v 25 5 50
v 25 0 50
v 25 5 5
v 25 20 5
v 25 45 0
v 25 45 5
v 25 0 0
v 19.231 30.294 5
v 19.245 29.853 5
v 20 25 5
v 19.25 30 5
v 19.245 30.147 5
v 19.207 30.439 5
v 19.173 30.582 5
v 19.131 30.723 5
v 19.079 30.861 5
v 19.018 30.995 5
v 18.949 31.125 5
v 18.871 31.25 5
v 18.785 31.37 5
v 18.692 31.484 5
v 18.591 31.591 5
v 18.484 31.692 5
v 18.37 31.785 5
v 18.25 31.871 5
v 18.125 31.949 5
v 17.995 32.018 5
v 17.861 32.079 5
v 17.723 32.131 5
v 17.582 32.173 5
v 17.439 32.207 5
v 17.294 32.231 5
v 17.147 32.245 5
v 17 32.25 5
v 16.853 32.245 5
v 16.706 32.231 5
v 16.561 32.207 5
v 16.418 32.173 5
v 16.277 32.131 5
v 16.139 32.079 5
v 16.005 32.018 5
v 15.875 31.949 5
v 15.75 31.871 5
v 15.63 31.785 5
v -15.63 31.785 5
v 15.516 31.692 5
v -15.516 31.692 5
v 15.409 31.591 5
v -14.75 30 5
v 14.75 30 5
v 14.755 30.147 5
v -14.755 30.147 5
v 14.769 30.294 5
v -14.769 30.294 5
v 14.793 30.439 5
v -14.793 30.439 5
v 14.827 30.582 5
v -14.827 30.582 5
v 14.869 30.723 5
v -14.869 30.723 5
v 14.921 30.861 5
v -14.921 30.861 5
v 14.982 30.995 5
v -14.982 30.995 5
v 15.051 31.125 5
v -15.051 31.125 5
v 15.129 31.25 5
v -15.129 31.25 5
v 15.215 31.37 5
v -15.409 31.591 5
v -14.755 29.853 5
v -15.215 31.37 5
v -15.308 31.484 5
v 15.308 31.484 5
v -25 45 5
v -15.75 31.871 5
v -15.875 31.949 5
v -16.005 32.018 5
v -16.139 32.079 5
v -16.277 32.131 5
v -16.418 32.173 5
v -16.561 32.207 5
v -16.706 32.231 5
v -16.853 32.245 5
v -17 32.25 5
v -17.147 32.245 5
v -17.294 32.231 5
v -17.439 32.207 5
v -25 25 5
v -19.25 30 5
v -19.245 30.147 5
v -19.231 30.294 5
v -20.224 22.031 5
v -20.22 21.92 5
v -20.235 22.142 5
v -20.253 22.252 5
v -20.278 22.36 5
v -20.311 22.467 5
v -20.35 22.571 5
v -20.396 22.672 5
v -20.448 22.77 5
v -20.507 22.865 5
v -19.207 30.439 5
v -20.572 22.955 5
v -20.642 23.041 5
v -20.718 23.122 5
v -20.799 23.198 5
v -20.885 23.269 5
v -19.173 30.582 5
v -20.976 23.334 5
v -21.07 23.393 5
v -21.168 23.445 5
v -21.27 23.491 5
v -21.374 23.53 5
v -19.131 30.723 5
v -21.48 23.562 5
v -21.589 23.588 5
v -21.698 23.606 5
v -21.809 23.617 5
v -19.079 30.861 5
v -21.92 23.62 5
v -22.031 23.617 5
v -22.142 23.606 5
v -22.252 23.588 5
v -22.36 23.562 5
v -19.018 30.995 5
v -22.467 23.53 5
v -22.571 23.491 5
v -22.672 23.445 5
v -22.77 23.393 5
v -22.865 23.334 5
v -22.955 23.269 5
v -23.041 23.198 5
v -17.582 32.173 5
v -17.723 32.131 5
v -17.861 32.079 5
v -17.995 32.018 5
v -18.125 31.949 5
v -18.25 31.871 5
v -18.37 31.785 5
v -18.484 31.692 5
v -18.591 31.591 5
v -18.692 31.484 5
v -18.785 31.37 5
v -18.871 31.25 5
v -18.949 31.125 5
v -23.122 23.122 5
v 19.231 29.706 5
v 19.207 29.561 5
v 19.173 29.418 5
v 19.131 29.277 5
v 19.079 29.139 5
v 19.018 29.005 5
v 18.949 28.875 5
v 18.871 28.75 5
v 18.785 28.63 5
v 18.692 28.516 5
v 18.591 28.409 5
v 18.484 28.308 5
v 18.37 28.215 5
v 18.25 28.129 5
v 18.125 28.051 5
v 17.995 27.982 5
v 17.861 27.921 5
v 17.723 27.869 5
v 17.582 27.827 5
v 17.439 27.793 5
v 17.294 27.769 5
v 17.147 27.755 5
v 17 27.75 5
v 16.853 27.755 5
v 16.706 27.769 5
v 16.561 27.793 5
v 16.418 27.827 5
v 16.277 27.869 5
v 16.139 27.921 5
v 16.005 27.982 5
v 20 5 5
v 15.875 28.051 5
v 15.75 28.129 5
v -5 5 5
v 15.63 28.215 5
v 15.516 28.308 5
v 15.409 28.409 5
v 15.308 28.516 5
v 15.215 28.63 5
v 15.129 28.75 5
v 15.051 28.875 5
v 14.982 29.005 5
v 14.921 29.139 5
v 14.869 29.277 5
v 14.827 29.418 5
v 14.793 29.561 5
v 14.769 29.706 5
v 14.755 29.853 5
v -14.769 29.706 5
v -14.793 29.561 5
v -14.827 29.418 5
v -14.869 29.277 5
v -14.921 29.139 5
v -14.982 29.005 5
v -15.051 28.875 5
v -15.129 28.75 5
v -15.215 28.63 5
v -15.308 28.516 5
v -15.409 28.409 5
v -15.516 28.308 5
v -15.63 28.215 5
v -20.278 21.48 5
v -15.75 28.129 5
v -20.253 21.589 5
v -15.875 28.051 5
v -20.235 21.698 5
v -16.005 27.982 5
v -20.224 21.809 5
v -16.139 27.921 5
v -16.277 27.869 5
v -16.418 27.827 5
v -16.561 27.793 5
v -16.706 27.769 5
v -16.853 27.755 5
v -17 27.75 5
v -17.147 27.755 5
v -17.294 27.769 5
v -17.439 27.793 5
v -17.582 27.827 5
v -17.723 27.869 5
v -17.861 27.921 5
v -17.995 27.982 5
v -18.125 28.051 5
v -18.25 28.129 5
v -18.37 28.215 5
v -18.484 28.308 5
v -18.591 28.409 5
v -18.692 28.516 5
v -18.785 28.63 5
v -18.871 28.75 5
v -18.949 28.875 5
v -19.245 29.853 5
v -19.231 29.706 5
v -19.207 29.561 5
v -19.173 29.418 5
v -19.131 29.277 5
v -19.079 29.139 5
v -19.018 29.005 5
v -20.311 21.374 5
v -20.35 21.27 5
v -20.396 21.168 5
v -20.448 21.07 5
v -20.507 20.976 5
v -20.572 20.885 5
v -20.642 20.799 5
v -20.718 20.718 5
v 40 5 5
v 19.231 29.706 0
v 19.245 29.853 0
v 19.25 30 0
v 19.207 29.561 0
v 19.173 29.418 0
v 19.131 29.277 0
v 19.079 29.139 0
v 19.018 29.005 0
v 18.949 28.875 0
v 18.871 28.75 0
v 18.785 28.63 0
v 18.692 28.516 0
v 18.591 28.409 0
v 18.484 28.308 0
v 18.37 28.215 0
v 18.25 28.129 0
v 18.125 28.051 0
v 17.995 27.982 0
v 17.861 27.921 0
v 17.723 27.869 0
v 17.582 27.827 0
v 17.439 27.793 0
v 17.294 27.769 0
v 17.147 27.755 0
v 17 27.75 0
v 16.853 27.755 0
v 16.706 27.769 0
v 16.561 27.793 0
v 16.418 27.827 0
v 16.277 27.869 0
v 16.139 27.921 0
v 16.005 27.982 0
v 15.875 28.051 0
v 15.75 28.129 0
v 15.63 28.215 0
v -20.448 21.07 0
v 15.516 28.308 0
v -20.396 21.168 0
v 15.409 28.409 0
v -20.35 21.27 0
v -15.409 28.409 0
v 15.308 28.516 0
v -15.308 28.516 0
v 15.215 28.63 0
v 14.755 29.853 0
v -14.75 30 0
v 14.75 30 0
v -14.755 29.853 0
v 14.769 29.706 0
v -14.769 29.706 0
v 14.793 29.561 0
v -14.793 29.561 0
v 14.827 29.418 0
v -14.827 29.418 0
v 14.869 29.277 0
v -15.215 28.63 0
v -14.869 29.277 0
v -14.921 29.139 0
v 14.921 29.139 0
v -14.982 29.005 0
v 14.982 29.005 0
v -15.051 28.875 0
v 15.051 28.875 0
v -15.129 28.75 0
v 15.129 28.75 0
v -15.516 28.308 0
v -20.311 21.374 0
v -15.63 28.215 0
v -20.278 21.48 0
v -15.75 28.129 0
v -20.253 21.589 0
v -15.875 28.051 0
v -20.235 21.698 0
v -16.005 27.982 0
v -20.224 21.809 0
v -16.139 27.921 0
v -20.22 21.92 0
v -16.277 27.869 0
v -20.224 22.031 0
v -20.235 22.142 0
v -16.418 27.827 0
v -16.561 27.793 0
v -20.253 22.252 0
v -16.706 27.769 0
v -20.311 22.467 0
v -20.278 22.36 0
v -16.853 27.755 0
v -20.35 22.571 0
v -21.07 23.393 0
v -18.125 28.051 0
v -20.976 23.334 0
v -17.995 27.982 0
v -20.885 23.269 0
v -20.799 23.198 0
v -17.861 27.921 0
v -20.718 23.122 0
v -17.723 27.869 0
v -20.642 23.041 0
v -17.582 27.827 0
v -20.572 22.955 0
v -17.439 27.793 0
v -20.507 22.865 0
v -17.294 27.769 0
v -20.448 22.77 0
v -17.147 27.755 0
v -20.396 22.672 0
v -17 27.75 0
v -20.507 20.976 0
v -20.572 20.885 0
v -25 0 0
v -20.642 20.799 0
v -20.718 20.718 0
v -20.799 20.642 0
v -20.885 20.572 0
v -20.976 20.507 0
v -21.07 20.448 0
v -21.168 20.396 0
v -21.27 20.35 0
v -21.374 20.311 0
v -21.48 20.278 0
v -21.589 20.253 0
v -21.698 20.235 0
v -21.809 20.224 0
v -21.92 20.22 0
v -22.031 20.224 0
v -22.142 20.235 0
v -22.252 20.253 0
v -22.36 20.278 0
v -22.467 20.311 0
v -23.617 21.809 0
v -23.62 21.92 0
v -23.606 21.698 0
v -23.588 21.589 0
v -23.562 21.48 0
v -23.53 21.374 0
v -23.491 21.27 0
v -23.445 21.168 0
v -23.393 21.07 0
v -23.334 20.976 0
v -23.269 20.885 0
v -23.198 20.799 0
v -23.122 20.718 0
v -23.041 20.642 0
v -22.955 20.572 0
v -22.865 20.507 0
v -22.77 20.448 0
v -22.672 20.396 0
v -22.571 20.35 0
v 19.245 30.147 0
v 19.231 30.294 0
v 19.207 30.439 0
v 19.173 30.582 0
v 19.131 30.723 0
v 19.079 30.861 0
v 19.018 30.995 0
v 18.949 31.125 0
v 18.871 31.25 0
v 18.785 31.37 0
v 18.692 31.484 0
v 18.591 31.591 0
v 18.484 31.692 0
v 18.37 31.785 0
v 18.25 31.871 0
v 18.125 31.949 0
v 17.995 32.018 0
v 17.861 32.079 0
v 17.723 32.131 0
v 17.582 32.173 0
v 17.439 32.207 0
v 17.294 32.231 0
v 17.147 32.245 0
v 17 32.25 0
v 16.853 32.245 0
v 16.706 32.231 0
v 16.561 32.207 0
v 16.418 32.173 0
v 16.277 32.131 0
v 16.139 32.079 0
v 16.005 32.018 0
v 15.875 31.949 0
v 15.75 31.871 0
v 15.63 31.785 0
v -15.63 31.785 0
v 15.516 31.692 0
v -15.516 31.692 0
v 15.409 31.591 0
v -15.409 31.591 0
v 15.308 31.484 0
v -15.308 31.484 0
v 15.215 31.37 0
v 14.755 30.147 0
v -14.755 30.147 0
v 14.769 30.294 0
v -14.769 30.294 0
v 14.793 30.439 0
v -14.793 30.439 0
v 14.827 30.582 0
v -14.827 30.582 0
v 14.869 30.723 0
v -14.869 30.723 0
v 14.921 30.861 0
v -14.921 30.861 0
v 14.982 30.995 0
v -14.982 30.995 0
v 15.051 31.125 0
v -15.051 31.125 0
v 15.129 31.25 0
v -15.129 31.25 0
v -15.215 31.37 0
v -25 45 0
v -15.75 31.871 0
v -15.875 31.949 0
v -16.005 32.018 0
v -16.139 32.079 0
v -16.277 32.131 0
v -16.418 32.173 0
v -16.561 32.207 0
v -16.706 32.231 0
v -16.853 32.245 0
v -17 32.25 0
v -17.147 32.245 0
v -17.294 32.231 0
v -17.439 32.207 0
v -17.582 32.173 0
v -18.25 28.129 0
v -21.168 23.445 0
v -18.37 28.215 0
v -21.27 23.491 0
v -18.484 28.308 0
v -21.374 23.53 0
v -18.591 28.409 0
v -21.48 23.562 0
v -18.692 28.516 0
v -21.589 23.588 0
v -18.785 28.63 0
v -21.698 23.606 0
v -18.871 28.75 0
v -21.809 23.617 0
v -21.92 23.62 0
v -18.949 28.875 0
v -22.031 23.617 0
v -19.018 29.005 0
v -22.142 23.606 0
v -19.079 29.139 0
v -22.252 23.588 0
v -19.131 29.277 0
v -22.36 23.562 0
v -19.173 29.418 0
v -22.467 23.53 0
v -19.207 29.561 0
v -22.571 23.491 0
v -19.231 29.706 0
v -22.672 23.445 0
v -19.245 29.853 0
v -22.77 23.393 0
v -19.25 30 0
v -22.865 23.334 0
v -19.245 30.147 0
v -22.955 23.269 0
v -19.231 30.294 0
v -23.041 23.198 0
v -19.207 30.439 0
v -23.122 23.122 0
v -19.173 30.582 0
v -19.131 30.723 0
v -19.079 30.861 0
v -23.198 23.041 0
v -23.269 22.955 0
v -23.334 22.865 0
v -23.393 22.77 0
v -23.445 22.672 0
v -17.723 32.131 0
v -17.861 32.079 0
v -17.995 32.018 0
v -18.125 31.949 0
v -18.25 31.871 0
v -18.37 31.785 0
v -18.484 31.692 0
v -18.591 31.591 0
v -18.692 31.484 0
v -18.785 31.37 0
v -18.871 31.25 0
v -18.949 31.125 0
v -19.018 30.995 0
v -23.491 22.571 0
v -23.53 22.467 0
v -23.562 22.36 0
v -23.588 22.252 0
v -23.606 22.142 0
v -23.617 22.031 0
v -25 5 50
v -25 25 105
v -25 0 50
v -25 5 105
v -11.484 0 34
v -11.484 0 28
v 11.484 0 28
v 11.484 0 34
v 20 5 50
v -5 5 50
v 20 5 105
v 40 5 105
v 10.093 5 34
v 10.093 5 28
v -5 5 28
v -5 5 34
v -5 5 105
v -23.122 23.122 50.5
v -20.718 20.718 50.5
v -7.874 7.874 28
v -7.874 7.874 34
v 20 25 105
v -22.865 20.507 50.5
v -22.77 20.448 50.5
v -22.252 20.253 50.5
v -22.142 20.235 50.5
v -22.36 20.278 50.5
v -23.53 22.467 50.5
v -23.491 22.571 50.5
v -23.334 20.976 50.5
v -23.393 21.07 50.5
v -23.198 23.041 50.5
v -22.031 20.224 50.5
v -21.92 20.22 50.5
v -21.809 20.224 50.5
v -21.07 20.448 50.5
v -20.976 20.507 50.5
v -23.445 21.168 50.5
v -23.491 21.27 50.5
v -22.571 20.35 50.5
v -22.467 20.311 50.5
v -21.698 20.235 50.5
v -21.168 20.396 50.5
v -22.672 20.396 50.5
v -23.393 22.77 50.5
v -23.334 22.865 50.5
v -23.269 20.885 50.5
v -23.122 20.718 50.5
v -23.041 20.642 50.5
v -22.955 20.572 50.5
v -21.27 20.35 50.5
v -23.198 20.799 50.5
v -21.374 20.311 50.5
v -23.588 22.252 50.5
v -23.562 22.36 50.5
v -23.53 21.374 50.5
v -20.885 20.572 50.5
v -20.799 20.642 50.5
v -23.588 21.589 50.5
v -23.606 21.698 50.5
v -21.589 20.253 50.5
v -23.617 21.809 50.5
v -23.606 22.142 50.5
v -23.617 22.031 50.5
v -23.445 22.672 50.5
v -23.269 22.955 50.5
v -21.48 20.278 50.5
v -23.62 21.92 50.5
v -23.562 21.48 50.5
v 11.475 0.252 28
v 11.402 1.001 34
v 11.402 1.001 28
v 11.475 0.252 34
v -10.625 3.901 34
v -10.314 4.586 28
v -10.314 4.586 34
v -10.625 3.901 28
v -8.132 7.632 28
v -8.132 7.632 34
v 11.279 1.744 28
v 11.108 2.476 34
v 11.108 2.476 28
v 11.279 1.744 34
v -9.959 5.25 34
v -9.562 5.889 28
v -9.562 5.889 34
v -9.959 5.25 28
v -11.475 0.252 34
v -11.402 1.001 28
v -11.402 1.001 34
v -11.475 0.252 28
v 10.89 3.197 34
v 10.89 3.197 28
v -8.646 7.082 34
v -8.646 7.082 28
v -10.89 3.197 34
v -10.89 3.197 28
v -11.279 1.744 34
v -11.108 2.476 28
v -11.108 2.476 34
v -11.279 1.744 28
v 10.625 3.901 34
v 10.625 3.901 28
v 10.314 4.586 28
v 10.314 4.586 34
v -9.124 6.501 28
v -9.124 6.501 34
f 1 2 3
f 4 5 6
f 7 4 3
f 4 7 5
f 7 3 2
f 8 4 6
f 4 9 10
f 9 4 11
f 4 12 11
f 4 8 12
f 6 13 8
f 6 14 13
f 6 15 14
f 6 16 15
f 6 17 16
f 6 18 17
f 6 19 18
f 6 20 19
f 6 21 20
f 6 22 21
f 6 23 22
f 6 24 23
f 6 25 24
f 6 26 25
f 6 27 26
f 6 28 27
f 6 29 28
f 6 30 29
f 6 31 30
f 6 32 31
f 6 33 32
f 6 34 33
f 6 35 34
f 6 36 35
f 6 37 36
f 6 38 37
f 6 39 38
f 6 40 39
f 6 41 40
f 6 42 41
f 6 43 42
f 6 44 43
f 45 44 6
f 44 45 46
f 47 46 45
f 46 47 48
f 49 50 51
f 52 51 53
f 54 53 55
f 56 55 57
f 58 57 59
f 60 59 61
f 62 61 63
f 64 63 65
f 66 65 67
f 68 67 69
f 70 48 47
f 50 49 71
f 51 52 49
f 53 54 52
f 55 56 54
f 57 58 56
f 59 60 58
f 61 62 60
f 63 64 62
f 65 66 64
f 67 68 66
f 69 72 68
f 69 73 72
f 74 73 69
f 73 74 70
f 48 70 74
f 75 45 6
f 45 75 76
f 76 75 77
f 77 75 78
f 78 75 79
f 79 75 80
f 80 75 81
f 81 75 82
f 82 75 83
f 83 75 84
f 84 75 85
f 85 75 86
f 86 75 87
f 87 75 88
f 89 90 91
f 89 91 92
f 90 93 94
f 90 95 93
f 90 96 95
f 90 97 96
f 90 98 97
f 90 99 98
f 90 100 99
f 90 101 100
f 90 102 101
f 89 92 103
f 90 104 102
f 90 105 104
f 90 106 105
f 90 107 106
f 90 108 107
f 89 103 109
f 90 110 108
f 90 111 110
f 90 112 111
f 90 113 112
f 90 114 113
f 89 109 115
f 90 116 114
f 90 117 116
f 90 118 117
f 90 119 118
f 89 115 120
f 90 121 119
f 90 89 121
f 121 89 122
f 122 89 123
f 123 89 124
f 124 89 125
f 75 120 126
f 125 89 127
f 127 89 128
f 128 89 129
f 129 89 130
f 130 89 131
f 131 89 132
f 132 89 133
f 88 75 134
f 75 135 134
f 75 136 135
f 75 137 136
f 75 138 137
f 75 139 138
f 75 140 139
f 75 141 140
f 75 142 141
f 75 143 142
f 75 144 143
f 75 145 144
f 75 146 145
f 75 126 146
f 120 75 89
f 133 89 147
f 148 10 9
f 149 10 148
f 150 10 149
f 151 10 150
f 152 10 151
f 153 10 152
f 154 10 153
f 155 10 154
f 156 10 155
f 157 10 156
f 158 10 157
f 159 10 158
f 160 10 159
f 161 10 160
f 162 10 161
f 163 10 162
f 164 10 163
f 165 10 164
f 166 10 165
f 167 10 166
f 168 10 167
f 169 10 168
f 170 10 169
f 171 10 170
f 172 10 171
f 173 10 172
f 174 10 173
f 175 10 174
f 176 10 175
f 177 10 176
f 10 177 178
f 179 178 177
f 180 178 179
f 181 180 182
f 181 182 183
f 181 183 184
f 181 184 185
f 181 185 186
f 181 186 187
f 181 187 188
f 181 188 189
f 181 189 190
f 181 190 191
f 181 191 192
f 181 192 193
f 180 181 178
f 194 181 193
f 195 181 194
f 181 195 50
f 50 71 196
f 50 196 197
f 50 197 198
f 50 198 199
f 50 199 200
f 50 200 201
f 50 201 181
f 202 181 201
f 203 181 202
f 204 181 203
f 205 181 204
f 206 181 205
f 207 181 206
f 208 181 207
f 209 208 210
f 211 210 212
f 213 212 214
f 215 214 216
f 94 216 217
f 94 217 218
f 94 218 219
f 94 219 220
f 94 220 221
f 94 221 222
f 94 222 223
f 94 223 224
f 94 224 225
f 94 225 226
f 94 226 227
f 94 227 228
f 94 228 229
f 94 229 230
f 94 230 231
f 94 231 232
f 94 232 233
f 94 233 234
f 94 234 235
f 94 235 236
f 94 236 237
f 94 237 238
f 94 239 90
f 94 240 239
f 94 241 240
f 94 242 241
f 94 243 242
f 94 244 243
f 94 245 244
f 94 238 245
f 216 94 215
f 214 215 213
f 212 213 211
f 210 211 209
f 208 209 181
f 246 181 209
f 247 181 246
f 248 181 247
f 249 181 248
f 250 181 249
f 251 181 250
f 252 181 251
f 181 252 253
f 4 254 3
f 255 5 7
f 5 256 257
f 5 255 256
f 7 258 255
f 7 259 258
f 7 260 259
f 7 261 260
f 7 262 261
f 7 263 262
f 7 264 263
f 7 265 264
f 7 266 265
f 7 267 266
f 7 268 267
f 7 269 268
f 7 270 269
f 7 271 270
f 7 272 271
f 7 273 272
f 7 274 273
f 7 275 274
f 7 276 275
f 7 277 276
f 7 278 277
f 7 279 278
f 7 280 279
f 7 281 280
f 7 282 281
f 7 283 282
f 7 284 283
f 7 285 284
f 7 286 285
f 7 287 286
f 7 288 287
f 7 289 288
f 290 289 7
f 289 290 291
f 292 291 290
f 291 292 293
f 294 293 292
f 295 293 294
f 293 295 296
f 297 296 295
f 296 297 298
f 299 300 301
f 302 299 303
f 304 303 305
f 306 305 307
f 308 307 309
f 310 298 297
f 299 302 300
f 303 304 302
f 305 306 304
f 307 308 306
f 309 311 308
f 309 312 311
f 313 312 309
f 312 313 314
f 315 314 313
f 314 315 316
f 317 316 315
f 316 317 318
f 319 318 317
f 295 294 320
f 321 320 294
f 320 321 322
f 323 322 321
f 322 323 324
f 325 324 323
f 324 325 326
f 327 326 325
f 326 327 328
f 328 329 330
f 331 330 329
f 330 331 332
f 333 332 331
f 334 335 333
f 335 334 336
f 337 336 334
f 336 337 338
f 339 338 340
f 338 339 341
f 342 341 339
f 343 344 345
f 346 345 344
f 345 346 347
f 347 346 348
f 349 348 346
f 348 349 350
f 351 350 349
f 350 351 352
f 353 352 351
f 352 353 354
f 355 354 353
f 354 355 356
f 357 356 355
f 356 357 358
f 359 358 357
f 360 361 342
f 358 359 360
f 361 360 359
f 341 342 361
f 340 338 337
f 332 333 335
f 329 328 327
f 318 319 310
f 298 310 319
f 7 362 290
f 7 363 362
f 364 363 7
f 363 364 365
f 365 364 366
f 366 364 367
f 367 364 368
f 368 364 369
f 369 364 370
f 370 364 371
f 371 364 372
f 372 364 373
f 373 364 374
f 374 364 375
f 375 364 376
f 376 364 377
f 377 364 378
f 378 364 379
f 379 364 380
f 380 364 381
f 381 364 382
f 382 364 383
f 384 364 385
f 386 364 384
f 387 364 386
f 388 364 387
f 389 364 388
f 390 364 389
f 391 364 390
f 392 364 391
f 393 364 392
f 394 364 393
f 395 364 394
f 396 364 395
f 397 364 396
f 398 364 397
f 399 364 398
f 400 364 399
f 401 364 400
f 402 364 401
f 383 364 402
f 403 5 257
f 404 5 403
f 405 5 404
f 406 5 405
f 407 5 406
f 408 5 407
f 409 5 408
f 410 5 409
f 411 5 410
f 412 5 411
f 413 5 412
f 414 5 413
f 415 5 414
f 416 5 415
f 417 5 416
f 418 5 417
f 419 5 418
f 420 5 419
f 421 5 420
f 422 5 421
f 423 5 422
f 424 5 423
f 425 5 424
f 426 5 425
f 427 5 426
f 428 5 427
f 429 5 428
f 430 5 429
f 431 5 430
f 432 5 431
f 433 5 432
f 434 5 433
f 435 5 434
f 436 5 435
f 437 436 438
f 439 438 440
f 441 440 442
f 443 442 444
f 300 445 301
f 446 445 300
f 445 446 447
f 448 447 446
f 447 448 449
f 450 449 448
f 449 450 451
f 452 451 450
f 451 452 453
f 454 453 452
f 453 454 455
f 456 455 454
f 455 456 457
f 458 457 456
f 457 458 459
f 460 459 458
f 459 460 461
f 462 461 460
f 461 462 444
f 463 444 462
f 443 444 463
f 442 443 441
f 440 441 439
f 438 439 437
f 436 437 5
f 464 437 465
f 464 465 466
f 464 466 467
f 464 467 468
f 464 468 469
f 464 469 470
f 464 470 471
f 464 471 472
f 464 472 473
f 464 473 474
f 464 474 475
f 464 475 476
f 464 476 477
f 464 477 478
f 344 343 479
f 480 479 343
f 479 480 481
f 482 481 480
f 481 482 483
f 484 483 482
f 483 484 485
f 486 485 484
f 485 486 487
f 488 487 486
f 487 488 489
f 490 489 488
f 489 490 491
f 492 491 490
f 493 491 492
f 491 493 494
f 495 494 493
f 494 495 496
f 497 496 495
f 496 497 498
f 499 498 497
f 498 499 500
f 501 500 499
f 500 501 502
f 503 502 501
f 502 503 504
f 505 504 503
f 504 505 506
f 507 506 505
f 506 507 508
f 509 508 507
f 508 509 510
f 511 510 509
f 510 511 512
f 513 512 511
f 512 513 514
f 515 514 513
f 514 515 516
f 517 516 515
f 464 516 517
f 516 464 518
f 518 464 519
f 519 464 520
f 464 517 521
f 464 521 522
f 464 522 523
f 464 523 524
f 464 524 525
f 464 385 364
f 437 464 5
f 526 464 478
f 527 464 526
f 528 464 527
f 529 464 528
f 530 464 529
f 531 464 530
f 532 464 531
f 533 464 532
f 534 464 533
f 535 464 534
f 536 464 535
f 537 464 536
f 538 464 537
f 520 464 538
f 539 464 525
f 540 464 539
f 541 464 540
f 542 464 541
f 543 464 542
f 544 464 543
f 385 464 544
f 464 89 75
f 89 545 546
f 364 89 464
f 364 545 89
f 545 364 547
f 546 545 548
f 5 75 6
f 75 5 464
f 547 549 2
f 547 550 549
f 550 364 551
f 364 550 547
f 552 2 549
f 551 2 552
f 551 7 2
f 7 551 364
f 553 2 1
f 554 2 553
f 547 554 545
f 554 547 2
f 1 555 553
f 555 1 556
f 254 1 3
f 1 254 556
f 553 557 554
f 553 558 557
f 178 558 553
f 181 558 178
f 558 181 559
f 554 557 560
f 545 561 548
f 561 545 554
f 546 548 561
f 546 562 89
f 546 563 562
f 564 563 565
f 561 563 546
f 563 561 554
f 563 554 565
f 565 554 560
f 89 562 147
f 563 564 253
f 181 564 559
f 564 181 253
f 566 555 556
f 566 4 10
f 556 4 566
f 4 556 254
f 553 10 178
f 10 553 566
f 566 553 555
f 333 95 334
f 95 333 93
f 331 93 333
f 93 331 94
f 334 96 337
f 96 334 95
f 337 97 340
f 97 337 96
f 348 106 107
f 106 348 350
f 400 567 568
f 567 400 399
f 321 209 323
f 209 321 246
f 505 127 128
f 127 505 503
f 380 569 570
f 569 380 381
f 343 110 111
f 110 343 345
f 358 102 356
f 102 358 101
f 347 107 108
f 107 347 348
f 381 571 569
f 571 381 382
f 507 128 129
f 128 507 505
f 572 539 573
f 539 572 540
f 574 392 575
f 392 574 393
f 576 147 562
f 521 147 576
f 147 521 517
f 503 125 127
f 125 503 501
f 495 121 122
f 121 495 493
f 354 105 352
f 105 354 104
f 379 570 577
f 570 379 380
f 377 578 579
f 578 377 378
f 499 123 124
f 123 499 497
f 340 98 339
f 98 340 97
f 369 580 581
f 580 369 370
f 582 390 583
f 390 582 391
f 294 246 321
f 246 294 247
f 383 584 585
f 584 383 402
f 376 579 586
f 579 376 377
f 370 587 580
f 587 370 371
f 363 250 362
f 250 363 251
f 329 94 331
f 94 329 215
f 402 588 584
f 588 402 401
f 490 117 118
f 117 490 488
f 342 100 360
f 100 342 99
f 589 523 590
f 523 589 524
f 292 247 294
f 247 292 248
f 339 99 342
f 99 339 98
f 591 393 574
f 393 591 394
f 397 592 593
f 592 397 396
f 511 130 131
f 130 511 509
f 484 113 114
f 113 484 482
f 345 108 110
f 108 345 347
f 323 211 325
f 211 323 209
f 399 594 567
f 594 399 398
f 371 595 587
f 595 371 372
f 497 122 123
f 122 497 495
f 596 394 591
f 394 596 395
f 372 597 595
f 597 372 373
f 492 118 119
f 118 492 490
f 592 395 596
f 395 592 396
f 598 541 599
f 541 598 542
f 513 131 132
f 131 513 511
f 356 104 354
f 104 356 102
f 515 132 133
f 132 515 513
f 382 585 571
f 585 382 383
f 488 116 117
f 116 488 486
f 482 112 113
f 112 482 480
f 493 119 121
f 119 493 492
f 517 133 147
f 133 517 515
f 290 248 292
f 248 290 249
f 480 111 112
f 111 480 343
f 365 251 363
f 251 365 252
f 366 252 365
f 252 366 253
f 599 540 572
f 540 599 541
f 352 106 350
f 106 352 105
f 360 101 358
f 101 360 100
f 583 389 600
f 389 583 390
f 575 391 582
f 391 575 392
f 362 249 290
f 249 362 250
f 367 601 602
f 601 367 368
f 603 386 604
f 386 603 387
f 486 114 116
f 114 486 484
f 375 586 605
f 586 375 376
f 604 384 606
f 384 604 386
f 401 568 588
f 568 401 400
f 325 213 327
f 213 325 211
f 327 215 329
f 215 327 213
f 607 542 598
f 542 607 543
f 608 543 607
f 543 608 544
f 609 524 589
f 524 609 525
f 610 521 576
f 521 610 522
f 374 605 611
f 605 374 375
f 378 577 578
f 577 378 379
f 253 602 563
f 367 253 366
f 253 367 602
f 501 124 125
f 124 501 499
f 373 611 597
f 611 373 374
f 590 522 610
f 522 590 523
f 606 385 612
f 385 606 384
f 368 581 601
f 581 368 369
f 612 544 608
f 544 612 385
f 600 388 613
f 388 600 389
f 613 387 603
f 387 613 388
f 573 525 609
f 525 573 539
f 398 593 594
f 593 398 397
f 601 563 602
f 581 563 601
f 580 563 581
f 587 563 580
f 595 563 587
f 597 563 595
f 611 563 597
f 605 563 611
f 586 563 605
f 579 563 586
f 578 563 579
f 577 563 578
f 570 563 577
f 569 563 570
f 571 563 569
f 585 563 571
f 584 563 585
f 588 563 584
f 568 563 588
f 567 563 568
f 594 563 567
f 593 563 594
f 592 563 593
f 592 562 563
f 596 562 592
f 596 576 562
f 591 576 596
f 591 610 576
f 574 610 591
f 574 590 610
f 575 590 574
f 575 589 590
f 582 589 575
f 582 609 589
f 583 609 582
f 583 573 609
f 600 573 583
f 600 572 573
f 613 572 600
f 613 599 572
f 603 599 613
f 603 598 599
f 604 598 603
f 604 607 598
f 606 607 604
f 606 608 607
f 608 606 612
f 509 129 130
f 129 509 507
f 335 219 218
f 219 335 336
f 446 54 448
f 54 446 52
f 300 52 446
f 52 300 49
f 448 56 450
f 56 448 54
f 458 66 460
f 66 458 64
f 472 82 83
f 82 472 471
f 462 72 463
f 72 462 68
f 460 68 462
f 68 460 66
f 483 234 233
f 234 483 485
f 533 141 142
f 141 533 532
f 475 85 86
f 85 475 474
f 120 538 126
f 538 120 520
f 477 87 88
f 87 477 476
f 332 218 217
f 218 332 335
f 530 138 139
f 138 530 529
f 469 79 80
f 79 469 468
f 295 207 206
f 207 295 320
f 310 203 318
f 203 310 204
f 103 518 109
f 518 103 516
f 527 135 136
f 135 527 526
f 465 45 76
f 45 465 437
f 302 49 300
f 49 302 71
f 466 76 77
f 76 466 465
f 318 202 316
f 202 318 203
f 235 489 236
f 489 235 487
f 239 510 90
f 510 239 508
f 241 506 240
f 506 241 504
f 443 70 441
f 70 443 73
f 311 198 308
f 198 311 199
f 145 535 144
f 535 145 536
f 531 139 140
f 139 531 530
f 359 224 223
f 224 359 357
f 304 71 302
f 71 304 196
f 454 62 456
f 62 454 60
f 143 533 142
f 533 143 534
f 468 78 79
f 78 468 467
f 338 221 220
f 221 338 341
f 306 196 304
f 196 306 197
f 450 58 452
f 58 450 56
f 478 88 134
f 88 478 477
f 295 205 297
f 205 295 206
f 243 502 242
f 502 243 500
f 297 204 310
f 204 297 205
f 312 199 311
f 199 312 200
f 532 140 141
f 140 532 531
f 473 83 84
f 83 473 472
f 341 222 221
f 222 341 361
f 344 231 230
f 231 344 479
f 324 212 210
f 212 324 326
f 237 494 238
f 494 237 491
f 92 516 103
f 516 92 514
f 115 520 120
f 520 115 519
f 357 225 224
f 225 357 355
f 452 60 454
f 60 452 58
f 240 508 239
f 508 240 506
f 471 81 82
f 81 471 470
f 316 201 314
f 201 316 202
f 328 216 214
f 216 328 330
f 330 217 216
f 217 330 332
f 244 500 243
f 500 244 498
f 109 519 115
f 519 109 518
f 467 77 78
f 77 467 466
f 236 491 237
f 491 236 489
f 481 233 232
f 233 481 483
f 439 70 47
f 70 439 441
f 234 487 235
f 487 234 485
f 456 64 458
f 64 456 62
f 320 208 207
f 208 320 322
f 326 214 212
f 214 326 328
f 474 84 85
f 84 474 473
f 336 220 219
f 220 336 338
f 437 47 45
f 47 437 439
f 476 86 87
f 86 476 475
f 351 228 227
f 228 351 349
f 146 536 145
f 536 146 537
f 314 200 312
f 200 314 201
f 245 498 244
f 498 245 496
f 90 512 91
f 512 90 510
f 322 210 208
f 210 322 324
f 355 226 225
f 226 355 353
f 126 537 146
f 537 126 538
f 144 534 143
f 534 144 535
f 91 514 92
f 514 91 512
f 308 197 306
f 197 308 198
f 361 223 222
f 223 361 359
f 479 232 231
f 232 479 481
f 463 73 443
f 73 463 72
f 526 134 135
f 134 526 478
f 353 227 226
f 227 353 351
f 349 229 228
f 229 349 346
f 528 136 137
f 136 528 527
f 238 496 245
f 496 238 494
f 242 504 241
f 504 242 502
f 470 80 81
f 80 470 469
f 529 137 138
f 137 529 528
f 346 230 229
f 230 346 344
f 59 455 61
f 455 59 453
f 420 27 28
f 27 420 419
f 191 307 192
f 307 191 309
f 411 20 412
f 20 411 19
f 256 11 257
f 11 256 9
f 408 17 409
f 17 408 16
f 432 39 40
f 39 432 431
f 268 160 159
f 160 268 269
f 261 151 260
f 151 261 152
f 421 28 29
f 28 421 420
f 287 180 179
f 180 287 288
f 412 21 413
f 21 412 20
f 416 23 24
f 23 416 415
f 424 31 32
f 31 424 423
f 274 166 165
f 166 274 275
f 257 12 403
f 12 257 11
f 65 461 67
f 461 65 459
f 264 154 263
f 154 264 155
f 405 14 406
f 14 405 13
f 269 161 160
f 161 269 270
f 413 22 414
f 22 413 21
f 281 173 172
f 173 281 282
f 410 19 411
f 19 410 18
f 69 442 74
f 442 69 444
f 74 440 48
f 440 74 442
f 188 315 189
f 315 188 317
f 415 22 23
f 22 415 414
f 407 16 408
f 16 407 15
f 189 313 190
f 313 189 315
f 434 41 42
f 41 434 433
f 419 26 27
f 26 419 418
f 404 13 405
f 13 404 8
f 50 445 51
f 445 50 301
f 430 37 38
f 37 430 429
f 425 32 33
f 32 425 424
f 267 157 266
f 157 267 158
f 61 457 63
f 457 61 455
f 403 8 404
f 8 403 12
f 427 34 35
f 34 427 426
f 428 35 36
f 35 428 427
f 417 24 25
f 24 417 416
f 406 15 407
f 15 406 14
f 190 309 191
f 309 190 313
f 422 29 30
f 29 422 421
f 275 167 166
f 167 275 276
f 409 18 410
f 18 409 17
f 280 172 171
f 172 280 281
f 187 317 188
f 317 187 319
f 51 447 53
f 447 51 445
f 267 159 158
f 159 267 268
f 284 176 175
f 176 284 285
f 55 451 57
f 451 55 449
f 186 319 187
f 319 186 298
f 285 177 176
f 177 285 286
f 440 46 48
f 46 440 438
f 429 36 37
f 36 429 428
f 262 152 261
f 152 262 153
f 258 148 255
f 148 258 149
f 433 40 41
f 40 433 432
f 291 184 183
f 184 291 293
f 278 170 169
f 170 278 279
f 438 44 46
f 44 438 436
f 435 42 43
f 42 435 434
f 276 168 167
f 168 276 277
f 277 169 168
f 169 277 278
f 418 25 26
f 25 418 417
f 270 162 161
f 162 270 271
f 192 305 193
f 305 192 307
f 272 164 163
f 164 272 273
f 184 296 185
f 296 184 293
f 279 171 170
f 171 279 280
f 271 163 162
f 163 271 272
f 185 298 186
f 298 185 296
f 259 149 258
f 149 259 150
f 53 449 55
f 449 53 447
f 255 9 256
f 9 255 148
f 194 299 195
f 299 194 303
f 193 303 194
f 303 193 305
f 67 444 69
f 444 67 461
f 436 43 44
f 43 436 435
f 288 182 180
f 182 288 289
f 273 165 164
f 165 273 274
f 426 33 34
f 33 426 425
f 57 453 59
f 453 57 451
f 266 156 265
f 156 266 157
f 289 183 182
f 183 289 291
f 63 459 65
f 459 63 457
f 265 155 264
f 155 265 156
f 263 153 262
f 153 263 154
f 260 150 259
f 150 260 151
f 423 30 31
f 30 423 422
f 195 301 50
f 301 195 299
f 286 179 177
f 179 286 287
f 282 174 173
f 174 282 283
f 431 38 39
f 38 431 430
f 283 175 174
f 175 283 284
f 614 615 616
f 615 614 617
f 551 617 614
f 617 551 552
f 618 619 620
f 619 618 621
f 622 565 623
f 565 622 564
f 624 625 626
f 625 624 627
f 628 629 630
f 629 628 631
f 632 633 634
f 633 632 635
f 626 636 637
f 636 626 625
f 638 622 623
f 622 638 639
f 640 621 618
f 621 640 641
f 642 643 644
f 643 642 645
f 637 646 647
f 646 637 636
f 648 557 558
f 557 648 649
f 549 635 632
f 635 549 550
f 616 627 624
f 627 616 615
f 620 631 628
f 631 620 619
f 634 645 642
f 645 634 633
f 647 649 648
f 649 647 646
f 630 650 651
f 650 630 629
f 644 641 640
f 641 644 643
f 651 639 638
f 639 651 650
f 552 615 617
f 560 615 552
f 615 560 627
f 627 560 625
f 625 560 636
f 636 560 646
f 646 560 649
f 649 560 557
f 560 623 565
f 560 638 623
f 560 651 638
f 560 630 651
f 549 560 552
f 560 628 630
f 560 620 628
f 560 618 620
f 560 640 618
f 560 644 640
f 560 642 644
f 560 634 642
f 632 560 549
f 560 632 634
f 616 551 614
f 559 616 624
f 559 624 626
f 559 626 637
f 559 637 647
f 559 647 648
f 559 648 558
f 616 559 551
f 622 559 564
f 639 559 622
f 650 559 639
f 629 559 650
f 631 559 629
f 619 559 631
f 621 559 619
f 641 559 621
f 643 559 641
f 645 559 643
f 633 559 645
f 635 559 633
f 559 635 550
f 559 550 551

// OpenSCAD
// L-shaped mounting bracket for NEMA 17 stepper motor (e.g. syringe pump)
// Print orientation: base plate on the bed, motor plate building up in +Z

// ---------------- Parameters ----------------
base_x1      = -25;   // base plate left edge (X)
base_x2      = 25;    // base plate right edge (X)
base_y       = 45;    // base plate length (Y)
base_t       = 5;     // base plate thickness (Z)

hole_m4_x    = -17;   // M4 through-hole centre X (base plate)
hole_m4_y    = 30;    // M4 through-hole centre Y (base plate)
hole_m4_x2   = 17;    // M4 through-hole centre X (second, base plate)

motor_x1     = -25;   // motor plate left edge (X)
motor_x2     = 25;    // motor plate right edge (X)
motor_y      = 5;     // motor plate thickness (Y)
motor_z      = 50;    // motor plate height (Z)

boss_d       = 23;    // motor centring boss hole diameter
boss_x       = 0;     // boss hole centre X
boss_z       = 28;    // boss hole centre Z

screw_d      = 3.4;   // M3 screw hole diameter
screw_pitch  = 31;    // square pattern side length
screw_n      = 4;     // number of screw holes

gusset_t     = 5;     // gusset thickness (X)
gusset_y     = 20;    // gusset leg along +Y
gusset_z     = 20;    // gusset leg along +Z

eps          = 0.5;   // cutter overshoot past faces
$fn          = 96;    // curve resolution

// ---------------- Model ----------------
difference() {
    union() {
        // Base plate
        translate([base_x1, 0, 0])
            cube([base_x2 - base_x1, base_y, base_t]);

        // Motor plate (stands on back edge of base)
        translate([motor_x1, 0, 0])
            cube([motor_x2 - motor_x1, motor_y, motor_z]);

        // Left gusset, flush with left edge (x = -25 to -20)
        translate([-25, 5, 5])
            linear_extrude([gusset_t])
                polygon([[0, 0], [gusset_y, 0], [0, gusset_z]]);

        // Right gusset, flush with right edge (x = 20 to 25)
        translate([20, 5, 5])
            linear_extrude([gusset_t])
                polygon([[0, 0], [gusset_y, 0], [0, gusset_z]]);
    }

    // Base plate through-holes (M4)
    translate([hole_m4_x, hole_m4_y, -eps])
        cylinder(d = 4.5, h = base_t + 2 * eps);

    translate([hole_m4_x2, hole_m4_y, -eps])
        cylinder(d = 4.5, h = base_t + 2 * eps);

    // Motor plate boss hole (along Y)
    translate([boss_x, -eps, boss_z])
        cylinder(d = boss_d, h = motor_y + 2 * eps);

    // M3 screw holes on square pattern, centred on boss hole
    for (i = [0 : screw_n - 1]) {
        a = screw_pitch / sqrt(2);   // offset from centre along X and Y
        x = (i % 2 == 0) ? -a : a;
        y = (i % 2 == 1) ? -a : a;
        translate([x, y, -eps])
            cylinder(d = screw_d, h = motor_z + 2 * eps);
    }
}
